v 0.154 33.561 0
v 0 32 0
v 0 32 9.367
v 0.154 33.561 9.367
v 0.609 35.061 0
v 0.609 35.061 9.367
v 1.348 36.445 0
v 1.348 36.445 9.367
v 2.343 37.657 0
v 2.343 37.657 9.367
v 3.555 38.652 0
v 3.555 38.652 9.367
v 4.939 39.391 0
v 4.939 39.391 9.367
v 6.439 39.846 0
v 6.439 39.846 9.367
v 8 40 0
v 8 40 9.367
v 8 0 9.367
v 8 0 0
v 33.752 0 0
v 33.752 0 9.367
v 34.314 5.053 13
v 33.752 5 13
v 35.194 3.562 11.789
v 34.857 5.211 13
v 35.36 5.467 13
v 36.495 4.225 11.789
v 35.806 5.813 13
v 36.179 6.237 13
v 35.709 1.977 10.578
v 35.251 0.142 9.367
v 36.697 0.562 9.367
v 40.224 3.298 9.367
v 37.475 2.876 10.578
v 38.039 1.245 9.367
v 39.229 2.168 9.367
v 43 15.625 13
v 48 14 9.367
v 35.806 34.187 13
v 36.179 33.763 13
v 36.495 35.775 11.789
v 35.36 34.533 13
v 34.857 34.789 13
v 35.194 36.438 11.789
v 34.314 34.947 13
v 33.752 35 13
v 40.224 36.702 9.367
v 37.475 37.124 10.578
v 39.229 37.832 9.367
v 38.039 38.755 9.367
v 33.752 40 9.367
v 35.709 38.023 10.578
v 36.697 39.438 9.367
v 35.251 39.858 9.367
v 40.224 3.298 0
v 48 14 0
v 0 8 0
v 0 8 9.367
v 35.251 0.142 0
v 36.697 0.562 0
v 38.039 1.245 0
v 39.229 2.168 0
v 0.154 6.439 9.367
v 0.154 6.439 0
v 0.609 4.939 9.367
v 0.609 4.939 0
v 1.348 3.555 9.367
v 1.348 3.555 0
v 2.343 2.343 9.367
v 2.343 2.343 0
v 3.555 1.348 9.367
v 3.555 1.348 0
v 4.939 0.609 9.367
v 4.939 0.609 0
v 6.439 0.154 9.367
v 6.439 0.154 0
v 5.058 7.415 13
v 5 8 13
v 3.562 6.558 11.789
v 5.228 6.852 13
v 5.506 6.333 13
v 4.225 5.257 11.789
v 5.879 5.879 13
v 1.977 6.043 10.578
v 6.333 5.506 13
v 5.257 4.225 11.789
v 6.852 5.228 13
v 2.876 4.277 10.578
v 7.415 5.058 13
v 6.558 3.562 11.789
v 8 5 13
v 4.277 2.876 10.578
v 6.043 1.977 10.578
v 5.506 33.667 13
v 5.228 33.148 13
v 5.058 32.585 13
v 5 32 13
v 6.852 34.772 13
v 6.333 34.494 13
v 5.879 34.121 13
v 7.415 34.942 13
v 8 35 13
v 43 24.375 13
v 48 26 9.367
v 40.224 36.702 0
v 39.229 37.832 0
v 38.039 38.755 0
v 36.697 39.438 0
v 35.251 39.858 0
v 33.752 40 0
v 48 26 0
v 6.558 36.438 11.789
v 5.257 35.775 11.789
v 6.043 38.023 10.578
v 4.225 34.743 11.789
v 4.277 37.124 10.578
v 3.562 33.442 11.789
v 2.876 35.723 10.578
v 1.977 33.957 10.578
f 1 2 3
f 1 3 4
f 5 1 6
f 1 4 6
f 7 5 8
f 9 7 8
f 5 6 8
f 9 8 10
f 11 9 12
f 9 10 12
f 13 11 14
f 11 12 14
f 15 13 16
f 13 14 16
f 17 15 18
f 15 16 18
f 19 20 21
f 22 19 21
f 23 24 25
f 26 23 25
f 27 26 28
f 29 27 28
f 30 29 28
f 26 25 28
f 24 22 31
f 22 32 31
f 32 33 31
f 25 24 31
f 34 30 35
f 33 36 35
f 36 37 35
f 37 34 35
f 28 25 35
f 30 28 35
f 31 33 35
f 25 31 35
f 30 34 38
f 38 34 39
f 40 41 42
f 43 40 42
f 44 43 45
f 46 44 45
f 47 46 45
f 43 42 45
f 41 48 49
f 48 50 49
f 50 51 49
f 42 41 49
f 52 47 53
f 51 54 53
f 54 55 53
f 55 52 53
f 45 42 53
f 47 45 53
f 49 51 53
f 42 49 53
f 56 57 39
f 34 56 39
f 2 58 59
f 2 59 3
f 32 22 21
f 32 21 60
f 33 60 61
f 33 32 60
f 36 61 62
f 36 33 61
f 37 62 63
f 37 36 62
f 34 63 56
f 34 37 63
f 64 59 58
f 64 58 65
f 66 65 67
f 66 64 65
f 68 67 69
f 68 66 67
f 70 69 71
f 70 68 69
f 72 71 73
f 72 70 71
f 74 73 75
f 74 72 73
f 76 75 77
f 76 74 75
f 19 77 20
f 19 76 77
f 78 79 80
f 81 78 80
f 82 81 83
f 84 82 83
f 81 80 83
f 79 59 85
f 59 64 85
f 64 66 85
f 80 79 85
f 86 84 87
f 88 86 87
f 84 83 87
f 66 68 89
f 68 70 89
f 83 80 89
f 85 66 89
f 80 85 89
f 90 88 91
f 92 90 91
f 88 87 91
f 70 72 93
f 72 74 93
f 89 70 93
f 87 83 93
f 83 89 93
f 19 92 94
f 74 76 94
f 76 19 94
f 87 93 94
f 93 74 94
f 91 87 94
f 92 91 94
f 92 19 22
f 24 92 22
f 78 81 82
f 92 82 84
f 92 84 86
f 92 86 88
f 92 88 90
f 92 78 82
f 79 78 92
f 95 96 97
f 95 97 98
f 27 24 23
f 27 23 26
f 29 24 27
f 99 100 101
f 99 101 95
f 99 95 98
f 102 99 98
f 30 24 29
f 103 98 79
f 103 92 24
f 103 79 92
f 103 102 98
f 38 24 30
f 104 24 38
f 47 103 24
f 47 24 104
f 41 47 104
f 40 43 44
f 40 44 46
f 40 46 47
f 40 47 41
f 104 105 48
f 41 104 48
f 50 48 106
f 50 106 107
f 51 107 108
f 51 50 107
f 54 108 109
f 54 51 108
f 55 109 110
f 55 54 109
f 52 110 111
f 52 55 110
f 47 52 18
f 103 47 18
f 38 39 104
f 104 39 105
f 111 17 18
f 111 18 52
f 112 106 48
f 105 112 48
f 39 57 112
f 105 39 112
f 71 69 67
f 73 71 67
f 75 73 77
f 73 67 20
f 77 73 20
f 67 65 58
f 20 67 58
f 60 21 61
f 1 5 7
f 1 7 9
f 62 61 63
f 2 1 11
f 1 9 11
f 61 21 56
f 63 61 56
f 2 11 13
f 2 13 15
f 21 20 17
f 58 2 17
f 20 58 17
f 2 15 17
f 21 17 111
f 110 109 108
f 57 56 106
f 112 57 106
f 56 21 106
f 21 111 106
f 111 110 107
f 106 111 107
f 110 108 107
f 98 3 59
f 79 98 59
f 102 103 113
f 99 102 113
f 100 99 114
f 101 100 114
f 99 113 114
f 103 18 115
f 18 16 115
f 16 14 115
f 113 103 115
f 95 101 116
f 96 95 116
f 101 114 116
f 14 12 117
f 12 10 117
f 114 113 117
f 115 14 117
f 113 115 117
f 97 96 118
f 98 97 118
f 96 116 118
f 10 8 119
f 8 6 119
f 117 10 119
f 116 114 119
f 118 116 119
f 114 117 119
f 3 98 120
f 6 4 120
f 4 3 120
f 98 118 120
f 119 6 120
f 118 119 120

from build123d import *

# Parameters (mm, degrees)
ESQUISSE1_W        = 48
ESQUISSE1_H        = 40
BOSS_EXTRU_1_DEPTH = 13
CONG_1_R           = 8
CHANFREIN1_SIZE    = 14
CHANFREIN1_SIZE2   = 10.171595392
CONG_2_R           = 8
CHANFREIN2_SIZE    = 5
CHANFREIN2_SIZE2   = 3.63271264


with BuildPart() as part:
    # Esquisse1 → Boss.-Extru.1 (new body)
    with BuildSketch(Plane.XY):
        with Locations((24, 20)):
            Rectangle(ESQUISSE1_W, ESQUISSE1_H)
    extrude(amount=BOSS_EXTRU_1_DEPTH)

    # Congé1
    cong_1_edges = [part.edges().sort_by_distance(p)[0] for p in [
        (0, 40, 6.5),
        (0, 0, 6.5),
    ]]
    fillet(cong_1_edges, radius=CONG_1_R)

    # Chanfrein1
    chanfrein1_edges = [part.edges().sort_by_distance(p)[0] for p in [
        (48, 40, 6.5),
        (48, 0, 6.5),
    ]]
    chanfrein1_side = [part.faces().sort_by_distance(p)[0] for p in [
        (48, 20, 6.5),
    ]]
    chamfer(chanfrein1_edges, length=CHANFREIN1_SIZE, length2=CHANFREIN1_SIZE2, reference=chanfrein1_side[0])

    # Congé2
    cong_2_edges = [part.edges().sort_by_distance(p)[0] for p in [
        (37.828404608, 0, 6.5),
        (37.828404608, 40, 6.5),
    ]]
    fillet(cong_2_edges, radius=CONG_2_R)

    # Chanfrein2
    chanfrein2_edges = [part.edges().sort_by_distance(p)[0] for p in [
        (20.876100506, 0, 13),
        (0, 20, 13),
        (2.343145751, 37.656854249, 13),
        (2.343145751, 2.343145751, 13),
        (48, 20, 13),
        (44.112168483, 31.351141009, 13),
        (20.876100506, 40, 13),
        (44.112168483, 8.648858991, 13),
        (37.38412501, 0.871947806, 13),
        (37.38412501, 39.128052194, 13),
    ]]
    chanfrein2_side = [part.faces().sort_by_distance(p)[0] for p in [
        (22.630137731, 20, 13),
    ]]
    chamfer(chanfrein2_edges, length=CHANFREIN2_SIZE, length2=CHANFREIN2_SIZE2, reference=chanfrein2_side[0])


solid = part.part
